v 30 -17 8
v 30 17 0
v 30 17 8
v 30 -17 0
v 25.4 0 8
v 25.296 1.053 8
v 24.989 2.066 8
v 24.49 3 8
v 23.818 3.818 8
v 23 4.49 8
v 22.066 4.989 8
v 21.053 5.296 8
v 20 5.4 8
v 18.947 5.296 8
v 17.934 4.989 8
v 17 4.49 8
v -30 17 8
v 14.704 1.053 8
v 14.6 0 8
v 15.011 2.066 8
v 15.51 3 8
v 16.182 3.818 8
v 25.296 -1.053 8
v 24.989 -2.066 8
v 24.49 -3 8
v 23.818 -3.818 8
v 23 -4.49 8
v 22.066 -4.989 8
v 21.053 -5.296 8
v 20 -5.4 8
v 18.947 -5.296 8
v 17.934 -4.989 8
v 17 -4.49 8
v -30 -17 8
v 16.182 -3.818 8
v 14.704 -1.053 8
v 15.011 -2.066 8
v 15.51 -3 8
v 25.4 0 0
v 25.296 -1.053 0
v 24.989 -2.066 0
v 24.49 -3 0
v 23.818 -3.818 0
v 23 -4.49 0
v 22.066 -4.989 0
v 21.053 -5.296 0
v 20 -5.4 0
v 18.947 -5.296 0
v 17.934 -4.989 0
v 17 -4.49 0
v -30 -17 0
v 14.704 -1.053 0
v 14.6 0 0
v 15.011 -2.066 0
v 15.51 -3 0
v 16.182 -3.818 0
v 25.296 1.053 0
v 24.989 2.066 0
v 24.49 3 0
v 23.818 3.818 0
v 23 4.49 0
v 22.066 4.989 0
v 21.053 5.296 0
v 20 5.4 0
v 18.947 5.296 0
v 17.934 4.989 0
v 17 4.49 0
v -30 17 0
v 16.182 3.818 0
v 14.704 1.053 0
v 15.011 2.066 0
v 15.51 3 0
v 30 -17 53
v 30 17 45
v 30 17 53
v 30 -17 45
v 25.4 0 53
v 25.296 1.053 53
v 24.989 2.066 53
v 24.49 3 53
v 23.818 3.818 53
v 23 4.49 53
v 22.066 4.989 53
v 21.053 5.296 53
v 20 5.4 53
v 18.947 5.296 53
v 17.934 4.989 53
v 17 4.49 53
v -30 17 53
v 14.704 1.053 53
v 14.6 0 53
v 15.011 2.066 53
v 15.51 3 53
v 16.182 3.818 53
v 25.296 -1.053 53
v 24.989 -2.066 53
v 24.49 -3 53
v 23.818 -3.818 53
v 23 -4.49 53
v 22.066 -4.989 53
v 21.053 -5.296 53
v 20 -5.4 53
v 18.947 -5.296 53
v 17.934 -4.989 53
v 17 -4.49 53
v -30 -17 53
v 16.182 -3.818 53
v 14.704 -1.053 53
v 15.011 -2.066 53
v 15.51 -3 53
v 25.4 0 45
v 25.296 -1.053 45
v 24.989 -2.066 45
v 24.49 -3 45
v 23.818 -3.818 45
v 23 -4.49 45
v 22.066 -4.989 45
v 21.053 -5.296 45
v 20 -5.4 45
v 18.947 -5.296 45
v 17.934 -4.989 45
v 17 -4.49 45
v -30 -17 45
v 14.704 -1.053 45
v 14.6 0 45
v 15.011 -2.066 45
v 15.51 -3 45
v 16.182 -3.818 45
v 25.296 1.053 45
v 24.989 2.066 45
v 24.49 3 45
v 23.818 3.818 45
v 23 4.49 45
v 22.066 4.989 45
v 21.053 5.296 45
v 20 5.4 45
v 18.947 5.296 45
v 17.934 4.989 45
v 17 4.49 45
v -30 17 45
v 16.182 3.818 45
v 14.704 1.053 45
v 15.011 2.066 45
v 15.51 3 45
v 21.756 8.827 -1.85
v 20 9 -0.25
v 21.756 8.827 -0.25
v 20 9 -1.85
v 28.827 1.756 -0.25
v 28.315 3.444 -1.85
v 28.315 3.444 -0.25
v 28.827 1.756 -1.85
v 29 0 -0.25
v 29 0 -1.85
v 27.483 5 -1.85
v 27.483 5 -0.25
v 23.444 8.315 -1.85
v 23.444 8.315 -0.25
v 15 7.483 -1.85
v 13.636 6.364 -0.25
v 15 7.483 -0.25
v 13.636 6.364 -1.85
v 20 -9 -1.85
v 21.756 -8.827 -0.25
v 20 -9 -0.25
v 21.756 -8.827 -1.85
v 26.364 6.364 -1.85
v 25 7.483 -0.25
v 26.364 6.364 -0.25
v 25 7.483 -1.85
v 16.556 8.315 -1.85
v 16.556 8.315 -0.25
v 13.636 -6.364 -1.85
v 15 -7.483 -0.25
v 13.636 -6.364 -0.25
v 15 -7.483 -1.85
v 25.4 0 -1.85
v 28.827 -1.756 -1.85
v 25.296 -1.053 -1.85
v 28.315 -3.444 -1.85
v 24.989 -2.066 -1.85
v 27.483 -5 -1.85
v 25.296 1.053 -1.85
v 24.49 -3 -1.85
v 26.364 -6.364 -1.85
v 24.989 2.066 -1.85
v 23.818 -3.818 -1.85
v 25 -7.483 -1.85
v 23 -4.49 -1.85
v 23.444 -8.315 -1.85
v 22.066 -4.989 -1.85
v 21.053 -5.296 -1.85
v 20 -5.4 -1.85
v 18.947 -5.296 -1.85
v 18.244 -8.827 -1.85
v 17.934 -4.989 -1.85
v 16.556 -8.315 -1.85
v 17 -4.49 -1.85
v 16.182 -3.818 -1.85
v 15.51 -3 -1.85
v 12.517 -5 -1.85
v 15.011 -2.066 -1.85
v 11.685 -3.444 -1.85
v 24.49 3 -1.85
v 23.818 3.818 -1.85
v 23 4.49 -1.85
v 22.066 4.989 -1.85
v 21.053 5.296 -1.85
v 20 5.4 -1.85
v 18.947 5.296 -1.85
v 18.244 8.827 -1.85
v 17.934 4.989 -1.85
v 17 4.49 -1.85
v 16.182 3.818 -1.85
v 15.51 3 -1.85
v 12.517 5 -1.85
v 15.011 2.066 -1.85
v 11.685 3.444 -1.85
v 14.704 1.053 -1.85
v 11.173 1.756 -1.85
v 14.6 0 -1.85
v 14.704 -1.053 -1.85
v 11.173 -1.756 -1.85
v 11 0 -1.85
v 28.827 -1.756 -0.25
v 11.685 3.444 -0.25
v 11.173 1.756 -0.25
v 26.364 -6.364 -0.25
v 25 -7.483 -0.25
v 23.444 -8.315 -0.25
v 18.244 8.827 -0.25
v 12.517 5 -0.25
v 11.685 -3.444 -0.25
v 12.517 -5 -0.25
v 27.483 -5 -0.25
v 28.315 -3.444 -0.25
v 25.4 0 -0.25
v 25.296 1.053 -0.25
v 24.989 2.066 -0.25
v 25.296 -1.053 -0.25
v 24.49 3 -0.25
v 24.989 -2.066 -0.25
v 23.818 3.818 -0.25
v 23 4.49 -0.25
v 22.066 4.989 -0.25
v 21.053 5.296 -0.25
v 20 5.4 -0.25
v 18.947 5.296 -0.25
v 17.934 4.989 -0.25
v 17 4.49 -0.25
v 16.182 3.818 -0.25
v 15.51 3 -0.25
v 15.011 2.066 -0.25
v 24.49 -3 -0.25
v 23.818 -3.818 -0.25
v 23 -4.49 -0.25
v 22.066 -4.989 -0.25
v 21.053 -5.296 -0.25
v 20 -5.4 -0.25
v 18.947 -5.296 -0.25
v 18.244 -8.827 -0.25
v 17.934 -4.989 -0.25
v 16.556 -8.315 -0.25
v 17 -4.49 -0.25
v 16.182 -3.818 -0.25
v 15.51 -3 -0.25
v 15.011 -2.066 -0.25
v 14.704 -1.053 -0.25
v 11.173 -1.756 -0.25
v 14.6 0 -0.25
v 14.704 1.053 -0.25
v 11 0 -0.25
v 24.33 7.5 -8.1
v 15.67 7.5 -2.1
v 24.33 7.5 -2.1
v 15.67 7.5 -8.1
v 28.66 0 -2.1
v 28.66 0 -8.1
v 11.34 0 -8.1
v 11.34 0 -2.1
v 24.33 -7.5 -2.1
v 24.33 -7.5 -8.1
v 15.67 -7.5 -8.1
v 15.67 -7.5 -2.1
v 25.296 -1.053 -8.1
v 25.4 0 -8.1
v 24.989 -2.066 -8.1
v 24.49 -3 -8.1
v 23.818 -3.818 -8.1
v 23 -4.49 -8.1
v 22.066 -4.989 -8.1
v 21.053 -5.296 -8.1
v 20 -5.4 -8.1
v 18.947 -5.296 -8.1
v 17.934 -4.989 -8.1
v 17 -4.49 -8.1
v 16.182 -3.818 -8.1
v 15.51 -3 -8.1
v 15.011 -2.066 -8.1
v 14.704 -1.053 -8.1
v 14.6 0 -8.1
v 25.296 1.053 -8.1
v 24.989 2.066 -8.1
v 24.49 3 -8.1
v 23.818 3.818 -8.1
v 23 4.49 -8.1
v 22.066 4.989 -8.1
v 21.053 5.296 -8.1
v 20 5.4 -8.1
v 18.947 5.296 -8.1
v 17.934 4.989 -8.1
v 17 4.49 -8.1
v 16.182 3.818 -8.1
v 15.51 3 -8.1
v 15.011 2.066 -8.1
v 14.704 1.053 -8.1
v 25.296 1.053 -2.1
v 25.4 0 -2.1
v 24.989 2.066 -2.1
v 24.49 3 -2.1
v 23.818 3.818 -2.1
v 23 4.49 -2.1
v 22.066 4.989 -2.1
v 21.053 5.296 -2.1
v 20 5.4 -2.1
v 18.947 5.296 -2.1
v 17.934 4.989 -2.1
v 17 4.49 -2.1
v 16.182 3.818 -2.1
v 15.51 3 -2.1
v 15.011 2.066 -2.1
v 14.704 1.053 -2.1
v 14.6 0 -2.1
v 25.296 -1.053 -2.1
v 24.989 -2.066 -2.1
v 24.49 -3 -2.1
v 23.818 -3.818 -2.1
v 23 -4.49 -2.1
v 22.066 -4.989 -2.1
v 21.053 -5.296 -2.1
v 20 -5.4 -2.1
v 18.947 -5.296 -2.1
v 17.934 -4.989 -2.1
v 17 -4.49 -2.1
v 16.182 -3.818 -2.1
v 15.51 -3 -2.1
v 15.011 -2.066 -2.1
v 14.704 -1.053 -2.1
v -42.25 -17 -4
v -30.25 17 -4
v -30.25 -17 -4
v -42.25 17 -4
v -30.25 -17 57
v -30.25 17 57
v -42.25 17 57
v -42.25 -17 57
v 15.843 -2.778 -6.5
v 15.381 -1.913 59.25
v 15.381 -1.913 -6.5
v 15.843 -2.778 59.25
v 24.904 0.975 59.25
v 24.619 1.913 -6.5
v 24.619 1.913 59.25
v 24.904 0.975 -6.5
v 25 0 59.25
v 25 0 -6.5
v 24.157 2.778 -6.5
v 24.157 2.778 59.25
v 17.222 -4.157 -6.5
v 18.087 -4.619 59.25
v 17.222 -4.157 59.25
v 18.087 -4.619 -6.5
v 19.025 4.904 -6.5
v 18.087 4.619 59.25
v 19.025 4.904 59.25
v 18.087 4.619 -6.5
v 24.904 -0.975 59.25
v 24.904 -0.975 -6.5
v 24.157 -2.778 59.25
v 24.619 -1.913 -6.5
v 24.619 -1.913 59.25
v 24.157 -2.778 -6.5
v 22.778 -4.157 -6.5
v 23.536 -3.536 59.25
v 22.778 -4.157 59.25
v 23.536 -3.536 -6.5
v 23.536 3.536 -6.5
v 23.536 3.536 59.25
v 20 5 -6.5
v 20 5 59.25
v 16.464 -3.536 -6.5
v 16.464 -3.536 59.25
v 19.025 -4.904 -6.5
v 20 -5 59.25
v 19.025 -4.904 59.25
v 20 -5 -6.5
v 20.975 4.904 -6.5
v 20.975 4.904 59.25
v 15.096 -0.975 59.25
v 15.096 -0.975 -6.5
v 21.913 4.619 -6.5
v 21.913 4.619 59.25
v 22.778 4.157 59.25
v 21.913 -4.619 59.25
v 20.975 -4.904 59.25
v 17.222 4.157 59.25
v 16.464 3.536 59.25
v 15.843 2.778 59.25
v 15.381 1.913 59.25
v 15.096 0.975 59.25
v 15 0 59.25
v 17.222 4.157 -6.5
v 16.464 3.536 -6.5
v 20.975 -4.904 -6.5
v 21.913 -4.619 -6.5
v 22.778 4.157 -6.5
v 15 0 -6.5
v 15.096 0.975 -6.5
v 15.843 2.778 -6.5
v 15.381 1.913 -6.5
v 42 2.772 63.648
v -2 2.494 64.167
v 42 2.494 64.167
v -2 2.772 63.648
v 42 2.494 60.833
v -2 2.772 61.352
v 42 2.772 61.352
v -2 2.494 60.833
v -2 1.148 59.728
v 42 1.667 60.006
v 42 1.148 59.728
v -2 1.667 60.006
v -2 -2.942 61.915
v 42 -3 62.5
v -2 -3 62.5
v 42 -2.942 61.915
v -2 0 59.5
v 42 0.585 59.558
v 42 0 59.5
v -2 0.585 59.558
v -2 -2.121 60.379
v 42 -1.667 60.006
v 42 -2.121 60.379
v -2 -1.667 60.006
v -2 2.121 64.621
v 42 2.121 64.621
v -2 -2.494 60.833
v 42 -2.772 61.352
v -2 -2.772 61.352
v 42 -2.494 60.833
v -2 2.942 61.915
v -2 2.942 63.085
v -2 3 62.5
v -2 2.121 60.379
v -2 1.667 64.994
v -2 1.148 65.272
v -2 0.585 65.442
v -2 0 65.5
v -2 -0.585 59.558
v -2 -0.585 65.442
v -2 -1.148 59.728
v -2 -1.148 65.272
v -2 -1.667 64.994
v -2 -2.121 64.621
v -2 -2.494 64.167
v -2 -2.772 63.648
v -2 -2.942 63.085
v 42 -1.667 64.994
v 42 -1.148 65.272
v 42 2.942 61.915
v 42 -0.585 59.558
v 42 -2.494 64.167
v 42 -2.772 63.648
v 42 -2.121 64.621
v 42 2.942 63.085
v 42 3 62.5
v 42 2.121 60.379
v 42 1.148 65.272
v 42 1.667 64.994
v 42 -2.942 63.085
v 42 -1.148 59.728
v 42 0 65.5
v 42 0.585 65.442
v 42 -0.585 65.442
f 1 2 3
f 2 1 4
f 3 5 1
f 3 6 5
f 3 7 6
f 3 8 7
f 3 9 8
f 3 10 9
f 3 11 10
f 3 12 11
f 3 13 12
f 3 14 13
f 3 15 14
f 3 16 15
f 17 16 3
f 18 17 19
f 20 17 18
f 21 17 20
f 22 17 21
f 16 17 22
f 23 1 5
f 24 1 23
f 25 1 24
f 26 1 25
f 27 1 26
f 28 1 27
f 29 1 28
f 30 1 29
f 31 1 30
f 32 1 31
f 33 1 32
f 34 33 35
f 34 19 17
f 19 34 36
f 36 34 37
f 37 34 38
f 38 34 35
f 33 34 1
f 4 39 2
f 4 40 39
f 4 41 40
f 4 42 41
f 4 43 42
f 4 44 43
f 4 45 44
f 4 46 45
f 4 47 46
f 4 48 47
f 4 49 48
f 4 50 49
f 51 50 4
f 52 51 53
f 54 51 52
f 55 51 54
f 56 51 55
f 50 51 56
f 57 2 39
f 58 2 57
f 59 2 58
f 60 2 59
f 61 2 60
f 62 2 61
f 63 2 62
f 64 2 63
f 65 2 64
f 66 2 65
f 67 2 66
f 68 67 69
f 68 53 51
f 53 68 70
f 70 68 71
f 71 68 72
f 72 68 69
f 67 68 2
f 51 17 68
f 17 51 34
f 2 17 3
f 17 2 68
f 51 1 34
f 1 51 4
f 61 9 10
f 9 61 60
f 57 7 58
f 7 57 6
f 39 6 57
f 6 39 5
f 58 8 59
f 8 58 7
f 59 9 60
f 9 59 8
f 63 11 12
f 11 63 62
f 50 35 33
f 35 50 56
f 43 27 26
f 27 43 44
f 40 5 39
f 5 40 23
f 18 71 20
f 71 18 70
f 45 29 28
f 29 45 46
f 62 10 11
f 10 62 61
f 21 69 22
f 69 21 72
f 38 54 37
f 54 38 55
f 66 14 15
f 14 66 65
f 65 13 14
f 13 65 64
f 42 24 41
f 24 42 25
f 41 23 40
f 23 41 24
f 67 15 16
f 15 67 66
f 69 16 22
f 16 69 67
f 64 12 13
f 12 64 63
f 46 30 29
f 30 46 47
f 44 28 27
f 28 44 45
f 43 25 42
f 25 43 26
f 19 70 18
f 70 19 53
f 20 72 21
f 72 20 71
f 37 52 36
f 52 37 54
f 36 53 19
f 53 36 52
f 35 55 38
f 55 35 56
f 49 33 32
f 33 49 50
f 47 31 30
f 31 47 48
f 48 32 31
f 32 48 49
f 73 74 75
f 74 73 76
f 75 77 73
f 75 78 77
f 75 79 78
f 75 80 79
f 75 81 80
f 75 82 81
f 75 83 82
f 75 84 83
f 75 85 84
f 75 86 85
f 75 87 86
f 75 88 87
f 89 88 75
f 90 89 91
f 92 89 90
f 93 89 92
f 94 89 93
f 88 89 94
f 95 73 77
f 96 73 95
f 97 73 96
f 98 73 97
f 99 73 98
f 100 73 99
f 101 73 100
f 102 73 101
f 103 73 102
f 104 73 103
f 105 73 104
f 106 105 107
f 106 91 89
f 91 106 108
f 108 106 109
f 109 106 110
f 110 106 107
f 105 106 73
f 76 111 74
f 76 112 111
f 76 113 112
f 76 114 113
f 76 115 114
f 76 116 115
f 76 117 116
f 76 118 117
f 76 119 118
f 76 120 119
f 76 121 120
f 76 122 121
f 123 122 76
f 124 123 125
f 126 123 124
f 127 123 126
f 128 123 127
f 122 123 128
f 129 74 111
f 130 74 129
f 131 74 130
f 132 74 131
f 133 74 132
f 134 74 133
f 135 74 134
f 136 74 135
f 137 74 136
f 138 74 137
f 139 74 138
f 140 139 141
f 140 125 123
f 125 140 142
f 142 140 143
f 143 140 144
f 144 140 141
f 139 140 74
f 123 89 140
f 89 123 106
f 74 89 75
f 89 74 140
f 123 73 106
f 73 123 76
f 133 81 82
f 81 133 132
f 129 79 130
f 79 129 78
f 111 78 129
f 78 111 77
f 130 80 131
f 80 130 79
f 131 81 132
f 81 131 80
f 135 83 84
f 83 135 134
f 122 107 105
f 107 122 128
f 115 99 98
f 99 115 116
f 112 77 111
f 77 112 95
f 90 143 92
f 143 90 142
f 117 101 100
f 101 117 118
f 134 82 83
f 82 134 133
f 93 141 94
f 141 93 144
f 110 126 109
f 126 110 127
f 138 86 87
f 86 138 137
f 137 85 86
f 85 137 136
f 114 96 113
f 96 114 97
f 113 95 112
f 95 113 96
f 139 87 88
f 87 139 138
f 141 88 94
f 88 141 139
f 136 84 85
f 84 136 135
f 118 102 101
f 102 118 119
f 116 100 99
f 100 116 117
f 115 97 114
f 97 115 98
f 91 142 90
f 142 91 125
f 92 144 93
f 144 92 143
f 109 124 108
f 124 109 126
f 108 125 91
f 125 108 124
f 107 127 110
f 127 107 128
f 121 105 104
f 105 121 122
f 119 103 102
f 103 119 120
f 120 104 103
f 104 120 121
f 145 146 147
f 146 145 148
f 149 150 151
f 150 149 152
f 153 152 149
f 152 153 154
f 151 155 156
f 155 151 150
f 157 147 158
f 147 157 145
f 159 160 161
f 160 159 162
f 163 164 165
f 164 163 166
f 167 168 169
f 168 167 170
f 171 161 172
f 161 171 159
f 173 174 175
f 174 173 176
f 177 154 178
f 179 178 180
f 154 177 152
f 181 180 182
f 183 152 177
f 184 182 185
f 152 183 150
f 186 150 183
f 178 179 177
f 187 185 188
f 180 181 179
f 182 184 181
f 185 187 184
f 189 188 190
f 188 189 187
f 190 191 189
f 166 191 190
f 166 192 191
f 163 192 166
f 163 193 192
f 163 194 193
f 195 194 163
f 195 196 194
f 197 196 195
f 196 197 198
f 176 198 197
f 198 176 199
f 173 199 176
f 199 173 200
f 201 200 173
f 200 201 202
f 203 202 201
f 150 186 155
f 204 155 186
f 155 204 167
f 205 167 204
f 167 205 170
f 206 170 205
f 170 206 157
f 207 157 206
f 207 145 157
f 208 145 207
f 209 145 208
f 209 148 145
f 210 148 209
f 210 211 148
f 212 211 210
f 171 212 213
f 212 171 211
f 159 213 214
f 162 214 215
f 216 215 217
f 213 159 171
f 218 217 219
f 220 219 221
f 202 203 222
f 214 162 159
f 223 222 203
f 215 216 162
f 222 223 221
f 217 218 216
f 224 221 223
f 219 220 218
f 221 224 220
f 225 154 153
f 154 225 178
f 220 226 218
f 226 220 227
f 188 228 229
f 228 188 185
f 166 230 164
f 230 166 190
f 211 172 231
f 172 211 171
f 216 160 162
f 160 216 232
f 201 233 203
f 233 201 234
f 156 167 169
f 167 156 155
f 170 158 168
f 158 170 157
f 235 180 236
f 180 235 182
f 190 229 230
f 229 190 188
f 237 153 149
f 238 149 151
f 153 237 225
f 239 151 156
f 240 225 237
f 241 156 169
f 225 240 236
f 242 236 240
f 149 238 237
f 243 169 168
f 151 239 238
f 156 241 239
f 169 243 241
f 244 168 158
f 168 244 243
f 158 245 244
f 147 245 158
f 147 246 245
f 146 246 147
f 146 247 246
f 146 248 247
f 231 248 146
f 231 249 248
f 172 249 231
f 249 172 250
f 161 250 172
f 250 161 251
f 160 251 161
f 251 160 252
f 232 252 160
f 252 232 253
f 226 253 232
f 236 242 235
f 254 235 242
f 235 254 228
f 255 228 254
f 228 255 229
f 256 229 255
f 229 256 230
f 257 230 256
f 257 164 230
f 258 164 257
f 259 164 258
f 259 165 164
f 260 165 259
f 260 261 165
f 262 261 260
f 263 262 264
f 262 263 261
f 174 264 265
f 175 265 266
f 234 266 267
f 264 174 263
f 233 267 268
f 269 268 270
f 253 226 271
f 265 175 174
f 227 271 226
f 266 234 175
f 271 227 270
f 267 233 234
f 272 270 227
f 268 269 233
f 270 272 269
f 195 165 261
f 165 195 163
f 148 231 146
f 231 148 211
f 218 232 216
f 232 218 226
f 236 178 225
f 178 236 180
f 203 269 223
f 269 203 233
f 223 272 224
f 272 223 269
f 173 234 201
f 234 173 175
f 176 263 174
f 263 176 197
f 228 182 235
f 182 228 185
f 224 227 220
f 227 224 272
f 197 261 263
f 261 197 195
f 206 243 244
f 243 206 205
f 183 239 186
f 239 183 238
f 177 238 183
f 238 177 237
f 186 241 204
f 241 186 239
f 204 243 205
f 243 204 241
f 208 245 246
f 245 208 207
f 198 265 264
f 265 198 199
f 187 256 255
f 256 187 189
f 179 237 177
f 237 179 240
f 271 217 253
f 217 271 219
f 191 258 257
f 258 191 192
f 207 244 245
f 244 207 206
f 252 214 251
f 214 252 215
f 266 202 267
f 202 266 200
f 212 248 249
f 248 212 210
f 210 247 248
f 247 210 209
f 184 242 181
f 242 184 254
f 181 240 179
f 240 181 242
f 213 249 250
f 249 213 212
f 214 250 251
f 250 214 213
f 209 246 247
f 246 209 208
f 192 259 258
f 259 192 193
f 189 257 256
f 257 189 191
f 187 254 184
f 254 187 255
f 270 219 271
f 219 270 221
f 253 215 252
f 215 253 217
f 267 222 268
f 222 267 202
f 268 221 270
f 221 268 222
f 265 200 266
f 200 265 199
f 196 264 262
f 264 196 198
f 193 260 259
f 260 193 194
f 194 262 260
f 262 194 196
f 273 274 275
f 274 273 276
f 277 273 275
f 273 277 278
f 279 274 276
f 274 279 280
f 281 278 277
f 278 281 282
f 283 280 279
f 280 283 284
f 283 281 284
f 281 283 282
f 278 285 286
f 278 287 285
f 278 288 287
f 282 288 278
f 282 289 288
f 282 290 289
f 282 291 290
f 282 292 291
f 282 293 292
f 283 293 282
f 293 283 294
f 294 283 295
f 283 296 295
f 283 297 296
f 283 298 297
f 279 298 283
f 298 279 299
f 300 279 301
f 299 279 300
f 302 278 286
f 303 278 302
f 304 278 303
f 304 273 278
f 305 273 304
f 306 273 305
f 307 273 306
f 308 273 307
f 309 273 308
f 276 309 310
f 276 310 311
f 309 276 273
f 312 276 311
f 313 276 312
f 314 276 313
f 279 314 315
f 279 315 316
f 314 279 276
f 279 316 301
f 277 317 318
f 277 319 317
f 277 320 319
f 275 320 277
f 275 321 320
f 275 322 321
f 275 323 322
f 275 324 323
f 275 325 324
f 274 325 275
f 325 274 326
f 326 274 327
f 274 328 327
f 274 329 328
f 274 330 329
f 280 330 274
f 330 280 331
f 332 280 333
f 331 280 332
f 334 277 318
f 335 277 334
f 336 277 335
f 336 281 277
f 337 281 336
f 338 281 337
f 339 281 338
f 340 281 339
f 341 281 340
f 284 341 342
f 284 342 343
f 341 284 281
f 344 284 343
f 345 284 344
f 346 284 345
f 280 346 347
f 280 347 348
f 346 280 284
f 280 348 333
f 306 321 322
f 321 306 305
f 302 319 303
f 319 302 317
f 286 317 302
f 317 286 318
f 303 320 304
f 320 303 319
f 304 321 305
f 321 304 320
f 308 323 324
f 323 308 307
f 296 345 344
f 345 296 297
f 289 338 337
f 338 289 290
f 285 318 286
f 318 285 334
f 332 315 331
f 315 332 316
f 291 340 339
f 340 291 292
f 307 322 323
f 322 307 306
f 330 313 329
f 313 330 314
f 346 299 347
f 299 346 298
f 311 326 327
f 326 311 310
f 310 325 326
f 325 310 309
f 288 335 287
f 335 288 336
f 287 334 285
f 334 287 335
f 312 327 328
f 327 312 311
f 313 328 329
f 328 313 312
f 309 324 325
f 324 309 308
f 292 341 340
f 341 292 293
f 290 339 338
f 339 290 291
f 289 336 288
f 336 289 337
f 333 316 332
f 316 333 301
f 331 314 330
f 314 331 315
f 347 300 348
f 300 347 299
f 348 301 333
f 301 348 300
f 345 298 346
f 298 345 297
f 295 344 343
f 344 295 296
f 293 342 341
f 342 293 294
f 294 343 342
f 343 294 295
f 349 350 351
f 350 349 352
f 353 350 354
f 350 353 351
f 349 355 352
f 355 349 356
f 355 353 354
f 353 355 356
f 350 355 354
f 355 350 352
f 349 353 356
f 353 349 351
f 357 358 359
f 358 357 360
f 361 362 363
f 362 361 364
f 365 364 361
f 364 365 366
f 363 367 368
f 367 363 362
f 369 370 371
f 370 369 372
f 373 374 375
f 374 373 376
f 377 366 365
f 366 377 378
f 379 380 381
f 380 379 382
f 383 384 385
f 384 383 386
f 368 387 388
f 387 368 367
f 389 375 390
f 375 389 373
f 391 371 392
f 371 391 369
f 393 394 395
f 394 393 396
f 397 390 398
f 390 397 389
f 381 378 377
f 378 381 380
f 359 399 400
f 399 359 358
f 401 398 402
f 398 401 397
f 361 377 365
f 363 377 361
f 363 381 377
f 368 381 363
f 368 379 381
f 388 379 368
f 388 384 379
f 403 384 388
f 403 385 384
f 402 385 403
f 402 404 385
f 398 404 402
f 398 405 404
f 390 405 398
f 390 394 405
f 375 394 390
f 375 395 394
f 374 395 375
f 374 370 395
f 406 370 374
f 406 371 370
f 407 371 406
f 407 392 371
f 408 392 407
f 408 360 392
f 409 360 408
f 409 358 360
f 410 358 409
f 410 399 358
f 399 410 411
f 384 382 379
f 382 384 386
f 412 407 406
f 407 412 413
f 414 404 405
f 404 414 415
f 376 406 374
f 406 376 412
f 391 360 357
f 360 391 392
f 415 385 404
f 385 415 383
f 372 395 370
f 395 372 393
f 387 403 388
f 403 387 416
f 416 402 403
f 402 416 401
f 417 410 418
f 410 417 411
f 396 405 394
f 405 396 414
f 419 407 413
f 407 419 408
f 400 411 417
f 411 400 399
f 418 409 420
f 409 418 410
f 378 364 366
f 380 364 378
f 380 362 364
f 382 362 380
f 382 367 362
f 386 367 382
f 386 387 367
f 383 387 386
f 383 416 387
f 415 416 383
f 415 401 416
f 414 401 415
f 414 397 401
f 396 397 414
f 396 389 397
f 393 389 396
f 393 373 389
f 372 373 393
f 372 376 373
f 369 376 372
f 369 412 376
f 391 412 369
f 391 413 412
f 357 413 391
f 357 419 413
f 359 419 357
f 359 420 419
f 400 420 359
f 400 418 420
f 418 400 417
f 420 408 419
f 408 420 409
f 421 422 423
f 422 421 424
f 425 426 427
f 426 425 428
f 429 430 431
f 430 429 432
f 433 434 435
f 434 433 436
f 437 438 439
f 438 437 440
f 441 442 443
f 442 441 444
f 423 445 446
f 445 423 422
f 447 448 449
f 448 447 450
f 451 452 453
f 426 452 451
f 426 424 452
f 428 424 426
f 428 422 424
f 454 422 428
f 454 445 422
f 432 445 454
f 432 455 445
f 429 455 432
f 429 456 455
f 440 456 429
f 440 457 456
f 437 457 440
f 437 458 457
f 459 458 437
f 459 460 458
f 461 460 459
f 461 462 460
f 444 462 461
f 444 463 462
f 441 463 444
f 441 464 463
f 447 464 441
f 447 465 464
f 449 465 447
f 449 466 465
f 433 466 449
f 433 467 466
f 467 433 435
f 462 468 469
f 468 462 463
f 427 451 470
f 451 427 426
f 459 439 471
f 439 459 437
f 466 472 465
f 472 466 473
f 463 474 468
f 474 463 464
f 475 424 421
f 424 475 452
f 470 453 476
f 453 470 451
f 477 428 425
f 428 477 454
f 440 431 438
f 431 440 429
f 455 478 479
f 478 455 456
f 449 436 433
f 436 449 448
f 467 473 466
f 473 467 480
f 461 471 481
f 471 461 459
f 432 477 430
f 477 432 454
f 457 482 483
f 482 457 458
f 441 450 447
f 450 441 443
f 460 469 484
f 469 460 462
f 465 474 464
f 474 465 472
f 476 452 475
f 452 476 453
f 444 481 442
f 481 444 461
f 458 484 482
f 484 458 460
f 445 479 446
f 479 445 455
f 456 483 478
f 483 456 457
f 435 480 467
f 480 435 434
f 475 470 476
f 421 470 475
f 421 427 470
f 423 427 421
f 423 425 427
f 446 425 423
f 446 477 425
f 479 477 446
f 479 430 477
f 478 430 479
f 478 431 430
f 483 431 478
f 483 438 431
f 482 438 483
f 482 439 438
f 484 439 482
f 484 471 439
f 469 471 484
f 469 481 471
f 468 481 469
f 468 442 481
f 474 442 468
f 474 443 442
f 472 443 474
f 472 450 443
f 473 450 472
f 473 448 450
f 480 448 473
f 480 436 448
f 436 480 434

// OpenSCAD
$fn = 32;

// ------------------------------------------------------------------------
// C clamp: throat 45 mm, screw d10
// Every part is its own module, assembly() places every instance.
// ------------------------------------------------------------------------

// --- part 1 ---
module clamp_arm() {
  difference() {
    translate([-30, -17, 0]) cube([60, 34, 8]);
    translate([20, 0, -1]) cylinder(h = 10, d = 10.8);
  }
}

// --- part 2 ---
module clamp_spine() {
  difference() {
    translate([-30.5, -17, 0]) cube([61, 34, 12]);
  }
}

// --- part 3 ---
module clamp_screw() {
  translate([0, 0, -32.875]) cylinder(h = 65.75, d = 10);
}

// --- part 4 ---
module clamp_washer() {
  difference() {
      translate([0, 0, 0]) cylinder(h = 1.6, d = 18);
      translate([0, 0, -1]) cylinder(h = 3.6, d = 10.8);
    }
}

// --- part 5 ---
module clamp_nut() {
  difference() {
    linear_extrude(height = 6) polygon(points = [[8.66, 0], [4.33, 7.5], [-4.33, 7.5], [-8.66, 0], [-4.33, -7.5], [4.33, -7.5]]);
    translate([0, 0, -1]) cylinder(h = 8, d = 10.8);
  }
}

// --- part 6 ---
module tommy_bar() {
  translate([0, 0, -22]) cylinder(h = 44, d = 6);
}

// --- assembly ---
module assembly() {
  color([0.80, 0.24, 0.20]) translate([0, 0, 0]) rotate([0, 0, 0]) clamp_arm();
  color([0.20, 0.45, 0.75]) translate([0, 0, 45]) rotate([0, 0, 0]) clamp_arm();
  color([0.25, 0.62, 0.32]) translate([-42.25, 0, 26.5]) rotate([0, 90, 0]) clamp_spine();
  color([0.92, 0.70, 0.18]) translate([20, 0, 26.375]) rotate([0, 0, 0]) clamp_screw();
  color([0.58, 0.35, 0.70]) translate([20, 0, -1.85]) rotate([0, 0, 0]) clamp_washer();
  color([0.16, 0.66, 0.66]) translate([20, 0, -8.1]) rotate([0, 0, 0]) clamp_nut();
  color([0.85, 0.48, 0.18]) translate([20, 0, 62.5]) rotate([0, 90, 0]) tommy_bar();
}

assembly();
